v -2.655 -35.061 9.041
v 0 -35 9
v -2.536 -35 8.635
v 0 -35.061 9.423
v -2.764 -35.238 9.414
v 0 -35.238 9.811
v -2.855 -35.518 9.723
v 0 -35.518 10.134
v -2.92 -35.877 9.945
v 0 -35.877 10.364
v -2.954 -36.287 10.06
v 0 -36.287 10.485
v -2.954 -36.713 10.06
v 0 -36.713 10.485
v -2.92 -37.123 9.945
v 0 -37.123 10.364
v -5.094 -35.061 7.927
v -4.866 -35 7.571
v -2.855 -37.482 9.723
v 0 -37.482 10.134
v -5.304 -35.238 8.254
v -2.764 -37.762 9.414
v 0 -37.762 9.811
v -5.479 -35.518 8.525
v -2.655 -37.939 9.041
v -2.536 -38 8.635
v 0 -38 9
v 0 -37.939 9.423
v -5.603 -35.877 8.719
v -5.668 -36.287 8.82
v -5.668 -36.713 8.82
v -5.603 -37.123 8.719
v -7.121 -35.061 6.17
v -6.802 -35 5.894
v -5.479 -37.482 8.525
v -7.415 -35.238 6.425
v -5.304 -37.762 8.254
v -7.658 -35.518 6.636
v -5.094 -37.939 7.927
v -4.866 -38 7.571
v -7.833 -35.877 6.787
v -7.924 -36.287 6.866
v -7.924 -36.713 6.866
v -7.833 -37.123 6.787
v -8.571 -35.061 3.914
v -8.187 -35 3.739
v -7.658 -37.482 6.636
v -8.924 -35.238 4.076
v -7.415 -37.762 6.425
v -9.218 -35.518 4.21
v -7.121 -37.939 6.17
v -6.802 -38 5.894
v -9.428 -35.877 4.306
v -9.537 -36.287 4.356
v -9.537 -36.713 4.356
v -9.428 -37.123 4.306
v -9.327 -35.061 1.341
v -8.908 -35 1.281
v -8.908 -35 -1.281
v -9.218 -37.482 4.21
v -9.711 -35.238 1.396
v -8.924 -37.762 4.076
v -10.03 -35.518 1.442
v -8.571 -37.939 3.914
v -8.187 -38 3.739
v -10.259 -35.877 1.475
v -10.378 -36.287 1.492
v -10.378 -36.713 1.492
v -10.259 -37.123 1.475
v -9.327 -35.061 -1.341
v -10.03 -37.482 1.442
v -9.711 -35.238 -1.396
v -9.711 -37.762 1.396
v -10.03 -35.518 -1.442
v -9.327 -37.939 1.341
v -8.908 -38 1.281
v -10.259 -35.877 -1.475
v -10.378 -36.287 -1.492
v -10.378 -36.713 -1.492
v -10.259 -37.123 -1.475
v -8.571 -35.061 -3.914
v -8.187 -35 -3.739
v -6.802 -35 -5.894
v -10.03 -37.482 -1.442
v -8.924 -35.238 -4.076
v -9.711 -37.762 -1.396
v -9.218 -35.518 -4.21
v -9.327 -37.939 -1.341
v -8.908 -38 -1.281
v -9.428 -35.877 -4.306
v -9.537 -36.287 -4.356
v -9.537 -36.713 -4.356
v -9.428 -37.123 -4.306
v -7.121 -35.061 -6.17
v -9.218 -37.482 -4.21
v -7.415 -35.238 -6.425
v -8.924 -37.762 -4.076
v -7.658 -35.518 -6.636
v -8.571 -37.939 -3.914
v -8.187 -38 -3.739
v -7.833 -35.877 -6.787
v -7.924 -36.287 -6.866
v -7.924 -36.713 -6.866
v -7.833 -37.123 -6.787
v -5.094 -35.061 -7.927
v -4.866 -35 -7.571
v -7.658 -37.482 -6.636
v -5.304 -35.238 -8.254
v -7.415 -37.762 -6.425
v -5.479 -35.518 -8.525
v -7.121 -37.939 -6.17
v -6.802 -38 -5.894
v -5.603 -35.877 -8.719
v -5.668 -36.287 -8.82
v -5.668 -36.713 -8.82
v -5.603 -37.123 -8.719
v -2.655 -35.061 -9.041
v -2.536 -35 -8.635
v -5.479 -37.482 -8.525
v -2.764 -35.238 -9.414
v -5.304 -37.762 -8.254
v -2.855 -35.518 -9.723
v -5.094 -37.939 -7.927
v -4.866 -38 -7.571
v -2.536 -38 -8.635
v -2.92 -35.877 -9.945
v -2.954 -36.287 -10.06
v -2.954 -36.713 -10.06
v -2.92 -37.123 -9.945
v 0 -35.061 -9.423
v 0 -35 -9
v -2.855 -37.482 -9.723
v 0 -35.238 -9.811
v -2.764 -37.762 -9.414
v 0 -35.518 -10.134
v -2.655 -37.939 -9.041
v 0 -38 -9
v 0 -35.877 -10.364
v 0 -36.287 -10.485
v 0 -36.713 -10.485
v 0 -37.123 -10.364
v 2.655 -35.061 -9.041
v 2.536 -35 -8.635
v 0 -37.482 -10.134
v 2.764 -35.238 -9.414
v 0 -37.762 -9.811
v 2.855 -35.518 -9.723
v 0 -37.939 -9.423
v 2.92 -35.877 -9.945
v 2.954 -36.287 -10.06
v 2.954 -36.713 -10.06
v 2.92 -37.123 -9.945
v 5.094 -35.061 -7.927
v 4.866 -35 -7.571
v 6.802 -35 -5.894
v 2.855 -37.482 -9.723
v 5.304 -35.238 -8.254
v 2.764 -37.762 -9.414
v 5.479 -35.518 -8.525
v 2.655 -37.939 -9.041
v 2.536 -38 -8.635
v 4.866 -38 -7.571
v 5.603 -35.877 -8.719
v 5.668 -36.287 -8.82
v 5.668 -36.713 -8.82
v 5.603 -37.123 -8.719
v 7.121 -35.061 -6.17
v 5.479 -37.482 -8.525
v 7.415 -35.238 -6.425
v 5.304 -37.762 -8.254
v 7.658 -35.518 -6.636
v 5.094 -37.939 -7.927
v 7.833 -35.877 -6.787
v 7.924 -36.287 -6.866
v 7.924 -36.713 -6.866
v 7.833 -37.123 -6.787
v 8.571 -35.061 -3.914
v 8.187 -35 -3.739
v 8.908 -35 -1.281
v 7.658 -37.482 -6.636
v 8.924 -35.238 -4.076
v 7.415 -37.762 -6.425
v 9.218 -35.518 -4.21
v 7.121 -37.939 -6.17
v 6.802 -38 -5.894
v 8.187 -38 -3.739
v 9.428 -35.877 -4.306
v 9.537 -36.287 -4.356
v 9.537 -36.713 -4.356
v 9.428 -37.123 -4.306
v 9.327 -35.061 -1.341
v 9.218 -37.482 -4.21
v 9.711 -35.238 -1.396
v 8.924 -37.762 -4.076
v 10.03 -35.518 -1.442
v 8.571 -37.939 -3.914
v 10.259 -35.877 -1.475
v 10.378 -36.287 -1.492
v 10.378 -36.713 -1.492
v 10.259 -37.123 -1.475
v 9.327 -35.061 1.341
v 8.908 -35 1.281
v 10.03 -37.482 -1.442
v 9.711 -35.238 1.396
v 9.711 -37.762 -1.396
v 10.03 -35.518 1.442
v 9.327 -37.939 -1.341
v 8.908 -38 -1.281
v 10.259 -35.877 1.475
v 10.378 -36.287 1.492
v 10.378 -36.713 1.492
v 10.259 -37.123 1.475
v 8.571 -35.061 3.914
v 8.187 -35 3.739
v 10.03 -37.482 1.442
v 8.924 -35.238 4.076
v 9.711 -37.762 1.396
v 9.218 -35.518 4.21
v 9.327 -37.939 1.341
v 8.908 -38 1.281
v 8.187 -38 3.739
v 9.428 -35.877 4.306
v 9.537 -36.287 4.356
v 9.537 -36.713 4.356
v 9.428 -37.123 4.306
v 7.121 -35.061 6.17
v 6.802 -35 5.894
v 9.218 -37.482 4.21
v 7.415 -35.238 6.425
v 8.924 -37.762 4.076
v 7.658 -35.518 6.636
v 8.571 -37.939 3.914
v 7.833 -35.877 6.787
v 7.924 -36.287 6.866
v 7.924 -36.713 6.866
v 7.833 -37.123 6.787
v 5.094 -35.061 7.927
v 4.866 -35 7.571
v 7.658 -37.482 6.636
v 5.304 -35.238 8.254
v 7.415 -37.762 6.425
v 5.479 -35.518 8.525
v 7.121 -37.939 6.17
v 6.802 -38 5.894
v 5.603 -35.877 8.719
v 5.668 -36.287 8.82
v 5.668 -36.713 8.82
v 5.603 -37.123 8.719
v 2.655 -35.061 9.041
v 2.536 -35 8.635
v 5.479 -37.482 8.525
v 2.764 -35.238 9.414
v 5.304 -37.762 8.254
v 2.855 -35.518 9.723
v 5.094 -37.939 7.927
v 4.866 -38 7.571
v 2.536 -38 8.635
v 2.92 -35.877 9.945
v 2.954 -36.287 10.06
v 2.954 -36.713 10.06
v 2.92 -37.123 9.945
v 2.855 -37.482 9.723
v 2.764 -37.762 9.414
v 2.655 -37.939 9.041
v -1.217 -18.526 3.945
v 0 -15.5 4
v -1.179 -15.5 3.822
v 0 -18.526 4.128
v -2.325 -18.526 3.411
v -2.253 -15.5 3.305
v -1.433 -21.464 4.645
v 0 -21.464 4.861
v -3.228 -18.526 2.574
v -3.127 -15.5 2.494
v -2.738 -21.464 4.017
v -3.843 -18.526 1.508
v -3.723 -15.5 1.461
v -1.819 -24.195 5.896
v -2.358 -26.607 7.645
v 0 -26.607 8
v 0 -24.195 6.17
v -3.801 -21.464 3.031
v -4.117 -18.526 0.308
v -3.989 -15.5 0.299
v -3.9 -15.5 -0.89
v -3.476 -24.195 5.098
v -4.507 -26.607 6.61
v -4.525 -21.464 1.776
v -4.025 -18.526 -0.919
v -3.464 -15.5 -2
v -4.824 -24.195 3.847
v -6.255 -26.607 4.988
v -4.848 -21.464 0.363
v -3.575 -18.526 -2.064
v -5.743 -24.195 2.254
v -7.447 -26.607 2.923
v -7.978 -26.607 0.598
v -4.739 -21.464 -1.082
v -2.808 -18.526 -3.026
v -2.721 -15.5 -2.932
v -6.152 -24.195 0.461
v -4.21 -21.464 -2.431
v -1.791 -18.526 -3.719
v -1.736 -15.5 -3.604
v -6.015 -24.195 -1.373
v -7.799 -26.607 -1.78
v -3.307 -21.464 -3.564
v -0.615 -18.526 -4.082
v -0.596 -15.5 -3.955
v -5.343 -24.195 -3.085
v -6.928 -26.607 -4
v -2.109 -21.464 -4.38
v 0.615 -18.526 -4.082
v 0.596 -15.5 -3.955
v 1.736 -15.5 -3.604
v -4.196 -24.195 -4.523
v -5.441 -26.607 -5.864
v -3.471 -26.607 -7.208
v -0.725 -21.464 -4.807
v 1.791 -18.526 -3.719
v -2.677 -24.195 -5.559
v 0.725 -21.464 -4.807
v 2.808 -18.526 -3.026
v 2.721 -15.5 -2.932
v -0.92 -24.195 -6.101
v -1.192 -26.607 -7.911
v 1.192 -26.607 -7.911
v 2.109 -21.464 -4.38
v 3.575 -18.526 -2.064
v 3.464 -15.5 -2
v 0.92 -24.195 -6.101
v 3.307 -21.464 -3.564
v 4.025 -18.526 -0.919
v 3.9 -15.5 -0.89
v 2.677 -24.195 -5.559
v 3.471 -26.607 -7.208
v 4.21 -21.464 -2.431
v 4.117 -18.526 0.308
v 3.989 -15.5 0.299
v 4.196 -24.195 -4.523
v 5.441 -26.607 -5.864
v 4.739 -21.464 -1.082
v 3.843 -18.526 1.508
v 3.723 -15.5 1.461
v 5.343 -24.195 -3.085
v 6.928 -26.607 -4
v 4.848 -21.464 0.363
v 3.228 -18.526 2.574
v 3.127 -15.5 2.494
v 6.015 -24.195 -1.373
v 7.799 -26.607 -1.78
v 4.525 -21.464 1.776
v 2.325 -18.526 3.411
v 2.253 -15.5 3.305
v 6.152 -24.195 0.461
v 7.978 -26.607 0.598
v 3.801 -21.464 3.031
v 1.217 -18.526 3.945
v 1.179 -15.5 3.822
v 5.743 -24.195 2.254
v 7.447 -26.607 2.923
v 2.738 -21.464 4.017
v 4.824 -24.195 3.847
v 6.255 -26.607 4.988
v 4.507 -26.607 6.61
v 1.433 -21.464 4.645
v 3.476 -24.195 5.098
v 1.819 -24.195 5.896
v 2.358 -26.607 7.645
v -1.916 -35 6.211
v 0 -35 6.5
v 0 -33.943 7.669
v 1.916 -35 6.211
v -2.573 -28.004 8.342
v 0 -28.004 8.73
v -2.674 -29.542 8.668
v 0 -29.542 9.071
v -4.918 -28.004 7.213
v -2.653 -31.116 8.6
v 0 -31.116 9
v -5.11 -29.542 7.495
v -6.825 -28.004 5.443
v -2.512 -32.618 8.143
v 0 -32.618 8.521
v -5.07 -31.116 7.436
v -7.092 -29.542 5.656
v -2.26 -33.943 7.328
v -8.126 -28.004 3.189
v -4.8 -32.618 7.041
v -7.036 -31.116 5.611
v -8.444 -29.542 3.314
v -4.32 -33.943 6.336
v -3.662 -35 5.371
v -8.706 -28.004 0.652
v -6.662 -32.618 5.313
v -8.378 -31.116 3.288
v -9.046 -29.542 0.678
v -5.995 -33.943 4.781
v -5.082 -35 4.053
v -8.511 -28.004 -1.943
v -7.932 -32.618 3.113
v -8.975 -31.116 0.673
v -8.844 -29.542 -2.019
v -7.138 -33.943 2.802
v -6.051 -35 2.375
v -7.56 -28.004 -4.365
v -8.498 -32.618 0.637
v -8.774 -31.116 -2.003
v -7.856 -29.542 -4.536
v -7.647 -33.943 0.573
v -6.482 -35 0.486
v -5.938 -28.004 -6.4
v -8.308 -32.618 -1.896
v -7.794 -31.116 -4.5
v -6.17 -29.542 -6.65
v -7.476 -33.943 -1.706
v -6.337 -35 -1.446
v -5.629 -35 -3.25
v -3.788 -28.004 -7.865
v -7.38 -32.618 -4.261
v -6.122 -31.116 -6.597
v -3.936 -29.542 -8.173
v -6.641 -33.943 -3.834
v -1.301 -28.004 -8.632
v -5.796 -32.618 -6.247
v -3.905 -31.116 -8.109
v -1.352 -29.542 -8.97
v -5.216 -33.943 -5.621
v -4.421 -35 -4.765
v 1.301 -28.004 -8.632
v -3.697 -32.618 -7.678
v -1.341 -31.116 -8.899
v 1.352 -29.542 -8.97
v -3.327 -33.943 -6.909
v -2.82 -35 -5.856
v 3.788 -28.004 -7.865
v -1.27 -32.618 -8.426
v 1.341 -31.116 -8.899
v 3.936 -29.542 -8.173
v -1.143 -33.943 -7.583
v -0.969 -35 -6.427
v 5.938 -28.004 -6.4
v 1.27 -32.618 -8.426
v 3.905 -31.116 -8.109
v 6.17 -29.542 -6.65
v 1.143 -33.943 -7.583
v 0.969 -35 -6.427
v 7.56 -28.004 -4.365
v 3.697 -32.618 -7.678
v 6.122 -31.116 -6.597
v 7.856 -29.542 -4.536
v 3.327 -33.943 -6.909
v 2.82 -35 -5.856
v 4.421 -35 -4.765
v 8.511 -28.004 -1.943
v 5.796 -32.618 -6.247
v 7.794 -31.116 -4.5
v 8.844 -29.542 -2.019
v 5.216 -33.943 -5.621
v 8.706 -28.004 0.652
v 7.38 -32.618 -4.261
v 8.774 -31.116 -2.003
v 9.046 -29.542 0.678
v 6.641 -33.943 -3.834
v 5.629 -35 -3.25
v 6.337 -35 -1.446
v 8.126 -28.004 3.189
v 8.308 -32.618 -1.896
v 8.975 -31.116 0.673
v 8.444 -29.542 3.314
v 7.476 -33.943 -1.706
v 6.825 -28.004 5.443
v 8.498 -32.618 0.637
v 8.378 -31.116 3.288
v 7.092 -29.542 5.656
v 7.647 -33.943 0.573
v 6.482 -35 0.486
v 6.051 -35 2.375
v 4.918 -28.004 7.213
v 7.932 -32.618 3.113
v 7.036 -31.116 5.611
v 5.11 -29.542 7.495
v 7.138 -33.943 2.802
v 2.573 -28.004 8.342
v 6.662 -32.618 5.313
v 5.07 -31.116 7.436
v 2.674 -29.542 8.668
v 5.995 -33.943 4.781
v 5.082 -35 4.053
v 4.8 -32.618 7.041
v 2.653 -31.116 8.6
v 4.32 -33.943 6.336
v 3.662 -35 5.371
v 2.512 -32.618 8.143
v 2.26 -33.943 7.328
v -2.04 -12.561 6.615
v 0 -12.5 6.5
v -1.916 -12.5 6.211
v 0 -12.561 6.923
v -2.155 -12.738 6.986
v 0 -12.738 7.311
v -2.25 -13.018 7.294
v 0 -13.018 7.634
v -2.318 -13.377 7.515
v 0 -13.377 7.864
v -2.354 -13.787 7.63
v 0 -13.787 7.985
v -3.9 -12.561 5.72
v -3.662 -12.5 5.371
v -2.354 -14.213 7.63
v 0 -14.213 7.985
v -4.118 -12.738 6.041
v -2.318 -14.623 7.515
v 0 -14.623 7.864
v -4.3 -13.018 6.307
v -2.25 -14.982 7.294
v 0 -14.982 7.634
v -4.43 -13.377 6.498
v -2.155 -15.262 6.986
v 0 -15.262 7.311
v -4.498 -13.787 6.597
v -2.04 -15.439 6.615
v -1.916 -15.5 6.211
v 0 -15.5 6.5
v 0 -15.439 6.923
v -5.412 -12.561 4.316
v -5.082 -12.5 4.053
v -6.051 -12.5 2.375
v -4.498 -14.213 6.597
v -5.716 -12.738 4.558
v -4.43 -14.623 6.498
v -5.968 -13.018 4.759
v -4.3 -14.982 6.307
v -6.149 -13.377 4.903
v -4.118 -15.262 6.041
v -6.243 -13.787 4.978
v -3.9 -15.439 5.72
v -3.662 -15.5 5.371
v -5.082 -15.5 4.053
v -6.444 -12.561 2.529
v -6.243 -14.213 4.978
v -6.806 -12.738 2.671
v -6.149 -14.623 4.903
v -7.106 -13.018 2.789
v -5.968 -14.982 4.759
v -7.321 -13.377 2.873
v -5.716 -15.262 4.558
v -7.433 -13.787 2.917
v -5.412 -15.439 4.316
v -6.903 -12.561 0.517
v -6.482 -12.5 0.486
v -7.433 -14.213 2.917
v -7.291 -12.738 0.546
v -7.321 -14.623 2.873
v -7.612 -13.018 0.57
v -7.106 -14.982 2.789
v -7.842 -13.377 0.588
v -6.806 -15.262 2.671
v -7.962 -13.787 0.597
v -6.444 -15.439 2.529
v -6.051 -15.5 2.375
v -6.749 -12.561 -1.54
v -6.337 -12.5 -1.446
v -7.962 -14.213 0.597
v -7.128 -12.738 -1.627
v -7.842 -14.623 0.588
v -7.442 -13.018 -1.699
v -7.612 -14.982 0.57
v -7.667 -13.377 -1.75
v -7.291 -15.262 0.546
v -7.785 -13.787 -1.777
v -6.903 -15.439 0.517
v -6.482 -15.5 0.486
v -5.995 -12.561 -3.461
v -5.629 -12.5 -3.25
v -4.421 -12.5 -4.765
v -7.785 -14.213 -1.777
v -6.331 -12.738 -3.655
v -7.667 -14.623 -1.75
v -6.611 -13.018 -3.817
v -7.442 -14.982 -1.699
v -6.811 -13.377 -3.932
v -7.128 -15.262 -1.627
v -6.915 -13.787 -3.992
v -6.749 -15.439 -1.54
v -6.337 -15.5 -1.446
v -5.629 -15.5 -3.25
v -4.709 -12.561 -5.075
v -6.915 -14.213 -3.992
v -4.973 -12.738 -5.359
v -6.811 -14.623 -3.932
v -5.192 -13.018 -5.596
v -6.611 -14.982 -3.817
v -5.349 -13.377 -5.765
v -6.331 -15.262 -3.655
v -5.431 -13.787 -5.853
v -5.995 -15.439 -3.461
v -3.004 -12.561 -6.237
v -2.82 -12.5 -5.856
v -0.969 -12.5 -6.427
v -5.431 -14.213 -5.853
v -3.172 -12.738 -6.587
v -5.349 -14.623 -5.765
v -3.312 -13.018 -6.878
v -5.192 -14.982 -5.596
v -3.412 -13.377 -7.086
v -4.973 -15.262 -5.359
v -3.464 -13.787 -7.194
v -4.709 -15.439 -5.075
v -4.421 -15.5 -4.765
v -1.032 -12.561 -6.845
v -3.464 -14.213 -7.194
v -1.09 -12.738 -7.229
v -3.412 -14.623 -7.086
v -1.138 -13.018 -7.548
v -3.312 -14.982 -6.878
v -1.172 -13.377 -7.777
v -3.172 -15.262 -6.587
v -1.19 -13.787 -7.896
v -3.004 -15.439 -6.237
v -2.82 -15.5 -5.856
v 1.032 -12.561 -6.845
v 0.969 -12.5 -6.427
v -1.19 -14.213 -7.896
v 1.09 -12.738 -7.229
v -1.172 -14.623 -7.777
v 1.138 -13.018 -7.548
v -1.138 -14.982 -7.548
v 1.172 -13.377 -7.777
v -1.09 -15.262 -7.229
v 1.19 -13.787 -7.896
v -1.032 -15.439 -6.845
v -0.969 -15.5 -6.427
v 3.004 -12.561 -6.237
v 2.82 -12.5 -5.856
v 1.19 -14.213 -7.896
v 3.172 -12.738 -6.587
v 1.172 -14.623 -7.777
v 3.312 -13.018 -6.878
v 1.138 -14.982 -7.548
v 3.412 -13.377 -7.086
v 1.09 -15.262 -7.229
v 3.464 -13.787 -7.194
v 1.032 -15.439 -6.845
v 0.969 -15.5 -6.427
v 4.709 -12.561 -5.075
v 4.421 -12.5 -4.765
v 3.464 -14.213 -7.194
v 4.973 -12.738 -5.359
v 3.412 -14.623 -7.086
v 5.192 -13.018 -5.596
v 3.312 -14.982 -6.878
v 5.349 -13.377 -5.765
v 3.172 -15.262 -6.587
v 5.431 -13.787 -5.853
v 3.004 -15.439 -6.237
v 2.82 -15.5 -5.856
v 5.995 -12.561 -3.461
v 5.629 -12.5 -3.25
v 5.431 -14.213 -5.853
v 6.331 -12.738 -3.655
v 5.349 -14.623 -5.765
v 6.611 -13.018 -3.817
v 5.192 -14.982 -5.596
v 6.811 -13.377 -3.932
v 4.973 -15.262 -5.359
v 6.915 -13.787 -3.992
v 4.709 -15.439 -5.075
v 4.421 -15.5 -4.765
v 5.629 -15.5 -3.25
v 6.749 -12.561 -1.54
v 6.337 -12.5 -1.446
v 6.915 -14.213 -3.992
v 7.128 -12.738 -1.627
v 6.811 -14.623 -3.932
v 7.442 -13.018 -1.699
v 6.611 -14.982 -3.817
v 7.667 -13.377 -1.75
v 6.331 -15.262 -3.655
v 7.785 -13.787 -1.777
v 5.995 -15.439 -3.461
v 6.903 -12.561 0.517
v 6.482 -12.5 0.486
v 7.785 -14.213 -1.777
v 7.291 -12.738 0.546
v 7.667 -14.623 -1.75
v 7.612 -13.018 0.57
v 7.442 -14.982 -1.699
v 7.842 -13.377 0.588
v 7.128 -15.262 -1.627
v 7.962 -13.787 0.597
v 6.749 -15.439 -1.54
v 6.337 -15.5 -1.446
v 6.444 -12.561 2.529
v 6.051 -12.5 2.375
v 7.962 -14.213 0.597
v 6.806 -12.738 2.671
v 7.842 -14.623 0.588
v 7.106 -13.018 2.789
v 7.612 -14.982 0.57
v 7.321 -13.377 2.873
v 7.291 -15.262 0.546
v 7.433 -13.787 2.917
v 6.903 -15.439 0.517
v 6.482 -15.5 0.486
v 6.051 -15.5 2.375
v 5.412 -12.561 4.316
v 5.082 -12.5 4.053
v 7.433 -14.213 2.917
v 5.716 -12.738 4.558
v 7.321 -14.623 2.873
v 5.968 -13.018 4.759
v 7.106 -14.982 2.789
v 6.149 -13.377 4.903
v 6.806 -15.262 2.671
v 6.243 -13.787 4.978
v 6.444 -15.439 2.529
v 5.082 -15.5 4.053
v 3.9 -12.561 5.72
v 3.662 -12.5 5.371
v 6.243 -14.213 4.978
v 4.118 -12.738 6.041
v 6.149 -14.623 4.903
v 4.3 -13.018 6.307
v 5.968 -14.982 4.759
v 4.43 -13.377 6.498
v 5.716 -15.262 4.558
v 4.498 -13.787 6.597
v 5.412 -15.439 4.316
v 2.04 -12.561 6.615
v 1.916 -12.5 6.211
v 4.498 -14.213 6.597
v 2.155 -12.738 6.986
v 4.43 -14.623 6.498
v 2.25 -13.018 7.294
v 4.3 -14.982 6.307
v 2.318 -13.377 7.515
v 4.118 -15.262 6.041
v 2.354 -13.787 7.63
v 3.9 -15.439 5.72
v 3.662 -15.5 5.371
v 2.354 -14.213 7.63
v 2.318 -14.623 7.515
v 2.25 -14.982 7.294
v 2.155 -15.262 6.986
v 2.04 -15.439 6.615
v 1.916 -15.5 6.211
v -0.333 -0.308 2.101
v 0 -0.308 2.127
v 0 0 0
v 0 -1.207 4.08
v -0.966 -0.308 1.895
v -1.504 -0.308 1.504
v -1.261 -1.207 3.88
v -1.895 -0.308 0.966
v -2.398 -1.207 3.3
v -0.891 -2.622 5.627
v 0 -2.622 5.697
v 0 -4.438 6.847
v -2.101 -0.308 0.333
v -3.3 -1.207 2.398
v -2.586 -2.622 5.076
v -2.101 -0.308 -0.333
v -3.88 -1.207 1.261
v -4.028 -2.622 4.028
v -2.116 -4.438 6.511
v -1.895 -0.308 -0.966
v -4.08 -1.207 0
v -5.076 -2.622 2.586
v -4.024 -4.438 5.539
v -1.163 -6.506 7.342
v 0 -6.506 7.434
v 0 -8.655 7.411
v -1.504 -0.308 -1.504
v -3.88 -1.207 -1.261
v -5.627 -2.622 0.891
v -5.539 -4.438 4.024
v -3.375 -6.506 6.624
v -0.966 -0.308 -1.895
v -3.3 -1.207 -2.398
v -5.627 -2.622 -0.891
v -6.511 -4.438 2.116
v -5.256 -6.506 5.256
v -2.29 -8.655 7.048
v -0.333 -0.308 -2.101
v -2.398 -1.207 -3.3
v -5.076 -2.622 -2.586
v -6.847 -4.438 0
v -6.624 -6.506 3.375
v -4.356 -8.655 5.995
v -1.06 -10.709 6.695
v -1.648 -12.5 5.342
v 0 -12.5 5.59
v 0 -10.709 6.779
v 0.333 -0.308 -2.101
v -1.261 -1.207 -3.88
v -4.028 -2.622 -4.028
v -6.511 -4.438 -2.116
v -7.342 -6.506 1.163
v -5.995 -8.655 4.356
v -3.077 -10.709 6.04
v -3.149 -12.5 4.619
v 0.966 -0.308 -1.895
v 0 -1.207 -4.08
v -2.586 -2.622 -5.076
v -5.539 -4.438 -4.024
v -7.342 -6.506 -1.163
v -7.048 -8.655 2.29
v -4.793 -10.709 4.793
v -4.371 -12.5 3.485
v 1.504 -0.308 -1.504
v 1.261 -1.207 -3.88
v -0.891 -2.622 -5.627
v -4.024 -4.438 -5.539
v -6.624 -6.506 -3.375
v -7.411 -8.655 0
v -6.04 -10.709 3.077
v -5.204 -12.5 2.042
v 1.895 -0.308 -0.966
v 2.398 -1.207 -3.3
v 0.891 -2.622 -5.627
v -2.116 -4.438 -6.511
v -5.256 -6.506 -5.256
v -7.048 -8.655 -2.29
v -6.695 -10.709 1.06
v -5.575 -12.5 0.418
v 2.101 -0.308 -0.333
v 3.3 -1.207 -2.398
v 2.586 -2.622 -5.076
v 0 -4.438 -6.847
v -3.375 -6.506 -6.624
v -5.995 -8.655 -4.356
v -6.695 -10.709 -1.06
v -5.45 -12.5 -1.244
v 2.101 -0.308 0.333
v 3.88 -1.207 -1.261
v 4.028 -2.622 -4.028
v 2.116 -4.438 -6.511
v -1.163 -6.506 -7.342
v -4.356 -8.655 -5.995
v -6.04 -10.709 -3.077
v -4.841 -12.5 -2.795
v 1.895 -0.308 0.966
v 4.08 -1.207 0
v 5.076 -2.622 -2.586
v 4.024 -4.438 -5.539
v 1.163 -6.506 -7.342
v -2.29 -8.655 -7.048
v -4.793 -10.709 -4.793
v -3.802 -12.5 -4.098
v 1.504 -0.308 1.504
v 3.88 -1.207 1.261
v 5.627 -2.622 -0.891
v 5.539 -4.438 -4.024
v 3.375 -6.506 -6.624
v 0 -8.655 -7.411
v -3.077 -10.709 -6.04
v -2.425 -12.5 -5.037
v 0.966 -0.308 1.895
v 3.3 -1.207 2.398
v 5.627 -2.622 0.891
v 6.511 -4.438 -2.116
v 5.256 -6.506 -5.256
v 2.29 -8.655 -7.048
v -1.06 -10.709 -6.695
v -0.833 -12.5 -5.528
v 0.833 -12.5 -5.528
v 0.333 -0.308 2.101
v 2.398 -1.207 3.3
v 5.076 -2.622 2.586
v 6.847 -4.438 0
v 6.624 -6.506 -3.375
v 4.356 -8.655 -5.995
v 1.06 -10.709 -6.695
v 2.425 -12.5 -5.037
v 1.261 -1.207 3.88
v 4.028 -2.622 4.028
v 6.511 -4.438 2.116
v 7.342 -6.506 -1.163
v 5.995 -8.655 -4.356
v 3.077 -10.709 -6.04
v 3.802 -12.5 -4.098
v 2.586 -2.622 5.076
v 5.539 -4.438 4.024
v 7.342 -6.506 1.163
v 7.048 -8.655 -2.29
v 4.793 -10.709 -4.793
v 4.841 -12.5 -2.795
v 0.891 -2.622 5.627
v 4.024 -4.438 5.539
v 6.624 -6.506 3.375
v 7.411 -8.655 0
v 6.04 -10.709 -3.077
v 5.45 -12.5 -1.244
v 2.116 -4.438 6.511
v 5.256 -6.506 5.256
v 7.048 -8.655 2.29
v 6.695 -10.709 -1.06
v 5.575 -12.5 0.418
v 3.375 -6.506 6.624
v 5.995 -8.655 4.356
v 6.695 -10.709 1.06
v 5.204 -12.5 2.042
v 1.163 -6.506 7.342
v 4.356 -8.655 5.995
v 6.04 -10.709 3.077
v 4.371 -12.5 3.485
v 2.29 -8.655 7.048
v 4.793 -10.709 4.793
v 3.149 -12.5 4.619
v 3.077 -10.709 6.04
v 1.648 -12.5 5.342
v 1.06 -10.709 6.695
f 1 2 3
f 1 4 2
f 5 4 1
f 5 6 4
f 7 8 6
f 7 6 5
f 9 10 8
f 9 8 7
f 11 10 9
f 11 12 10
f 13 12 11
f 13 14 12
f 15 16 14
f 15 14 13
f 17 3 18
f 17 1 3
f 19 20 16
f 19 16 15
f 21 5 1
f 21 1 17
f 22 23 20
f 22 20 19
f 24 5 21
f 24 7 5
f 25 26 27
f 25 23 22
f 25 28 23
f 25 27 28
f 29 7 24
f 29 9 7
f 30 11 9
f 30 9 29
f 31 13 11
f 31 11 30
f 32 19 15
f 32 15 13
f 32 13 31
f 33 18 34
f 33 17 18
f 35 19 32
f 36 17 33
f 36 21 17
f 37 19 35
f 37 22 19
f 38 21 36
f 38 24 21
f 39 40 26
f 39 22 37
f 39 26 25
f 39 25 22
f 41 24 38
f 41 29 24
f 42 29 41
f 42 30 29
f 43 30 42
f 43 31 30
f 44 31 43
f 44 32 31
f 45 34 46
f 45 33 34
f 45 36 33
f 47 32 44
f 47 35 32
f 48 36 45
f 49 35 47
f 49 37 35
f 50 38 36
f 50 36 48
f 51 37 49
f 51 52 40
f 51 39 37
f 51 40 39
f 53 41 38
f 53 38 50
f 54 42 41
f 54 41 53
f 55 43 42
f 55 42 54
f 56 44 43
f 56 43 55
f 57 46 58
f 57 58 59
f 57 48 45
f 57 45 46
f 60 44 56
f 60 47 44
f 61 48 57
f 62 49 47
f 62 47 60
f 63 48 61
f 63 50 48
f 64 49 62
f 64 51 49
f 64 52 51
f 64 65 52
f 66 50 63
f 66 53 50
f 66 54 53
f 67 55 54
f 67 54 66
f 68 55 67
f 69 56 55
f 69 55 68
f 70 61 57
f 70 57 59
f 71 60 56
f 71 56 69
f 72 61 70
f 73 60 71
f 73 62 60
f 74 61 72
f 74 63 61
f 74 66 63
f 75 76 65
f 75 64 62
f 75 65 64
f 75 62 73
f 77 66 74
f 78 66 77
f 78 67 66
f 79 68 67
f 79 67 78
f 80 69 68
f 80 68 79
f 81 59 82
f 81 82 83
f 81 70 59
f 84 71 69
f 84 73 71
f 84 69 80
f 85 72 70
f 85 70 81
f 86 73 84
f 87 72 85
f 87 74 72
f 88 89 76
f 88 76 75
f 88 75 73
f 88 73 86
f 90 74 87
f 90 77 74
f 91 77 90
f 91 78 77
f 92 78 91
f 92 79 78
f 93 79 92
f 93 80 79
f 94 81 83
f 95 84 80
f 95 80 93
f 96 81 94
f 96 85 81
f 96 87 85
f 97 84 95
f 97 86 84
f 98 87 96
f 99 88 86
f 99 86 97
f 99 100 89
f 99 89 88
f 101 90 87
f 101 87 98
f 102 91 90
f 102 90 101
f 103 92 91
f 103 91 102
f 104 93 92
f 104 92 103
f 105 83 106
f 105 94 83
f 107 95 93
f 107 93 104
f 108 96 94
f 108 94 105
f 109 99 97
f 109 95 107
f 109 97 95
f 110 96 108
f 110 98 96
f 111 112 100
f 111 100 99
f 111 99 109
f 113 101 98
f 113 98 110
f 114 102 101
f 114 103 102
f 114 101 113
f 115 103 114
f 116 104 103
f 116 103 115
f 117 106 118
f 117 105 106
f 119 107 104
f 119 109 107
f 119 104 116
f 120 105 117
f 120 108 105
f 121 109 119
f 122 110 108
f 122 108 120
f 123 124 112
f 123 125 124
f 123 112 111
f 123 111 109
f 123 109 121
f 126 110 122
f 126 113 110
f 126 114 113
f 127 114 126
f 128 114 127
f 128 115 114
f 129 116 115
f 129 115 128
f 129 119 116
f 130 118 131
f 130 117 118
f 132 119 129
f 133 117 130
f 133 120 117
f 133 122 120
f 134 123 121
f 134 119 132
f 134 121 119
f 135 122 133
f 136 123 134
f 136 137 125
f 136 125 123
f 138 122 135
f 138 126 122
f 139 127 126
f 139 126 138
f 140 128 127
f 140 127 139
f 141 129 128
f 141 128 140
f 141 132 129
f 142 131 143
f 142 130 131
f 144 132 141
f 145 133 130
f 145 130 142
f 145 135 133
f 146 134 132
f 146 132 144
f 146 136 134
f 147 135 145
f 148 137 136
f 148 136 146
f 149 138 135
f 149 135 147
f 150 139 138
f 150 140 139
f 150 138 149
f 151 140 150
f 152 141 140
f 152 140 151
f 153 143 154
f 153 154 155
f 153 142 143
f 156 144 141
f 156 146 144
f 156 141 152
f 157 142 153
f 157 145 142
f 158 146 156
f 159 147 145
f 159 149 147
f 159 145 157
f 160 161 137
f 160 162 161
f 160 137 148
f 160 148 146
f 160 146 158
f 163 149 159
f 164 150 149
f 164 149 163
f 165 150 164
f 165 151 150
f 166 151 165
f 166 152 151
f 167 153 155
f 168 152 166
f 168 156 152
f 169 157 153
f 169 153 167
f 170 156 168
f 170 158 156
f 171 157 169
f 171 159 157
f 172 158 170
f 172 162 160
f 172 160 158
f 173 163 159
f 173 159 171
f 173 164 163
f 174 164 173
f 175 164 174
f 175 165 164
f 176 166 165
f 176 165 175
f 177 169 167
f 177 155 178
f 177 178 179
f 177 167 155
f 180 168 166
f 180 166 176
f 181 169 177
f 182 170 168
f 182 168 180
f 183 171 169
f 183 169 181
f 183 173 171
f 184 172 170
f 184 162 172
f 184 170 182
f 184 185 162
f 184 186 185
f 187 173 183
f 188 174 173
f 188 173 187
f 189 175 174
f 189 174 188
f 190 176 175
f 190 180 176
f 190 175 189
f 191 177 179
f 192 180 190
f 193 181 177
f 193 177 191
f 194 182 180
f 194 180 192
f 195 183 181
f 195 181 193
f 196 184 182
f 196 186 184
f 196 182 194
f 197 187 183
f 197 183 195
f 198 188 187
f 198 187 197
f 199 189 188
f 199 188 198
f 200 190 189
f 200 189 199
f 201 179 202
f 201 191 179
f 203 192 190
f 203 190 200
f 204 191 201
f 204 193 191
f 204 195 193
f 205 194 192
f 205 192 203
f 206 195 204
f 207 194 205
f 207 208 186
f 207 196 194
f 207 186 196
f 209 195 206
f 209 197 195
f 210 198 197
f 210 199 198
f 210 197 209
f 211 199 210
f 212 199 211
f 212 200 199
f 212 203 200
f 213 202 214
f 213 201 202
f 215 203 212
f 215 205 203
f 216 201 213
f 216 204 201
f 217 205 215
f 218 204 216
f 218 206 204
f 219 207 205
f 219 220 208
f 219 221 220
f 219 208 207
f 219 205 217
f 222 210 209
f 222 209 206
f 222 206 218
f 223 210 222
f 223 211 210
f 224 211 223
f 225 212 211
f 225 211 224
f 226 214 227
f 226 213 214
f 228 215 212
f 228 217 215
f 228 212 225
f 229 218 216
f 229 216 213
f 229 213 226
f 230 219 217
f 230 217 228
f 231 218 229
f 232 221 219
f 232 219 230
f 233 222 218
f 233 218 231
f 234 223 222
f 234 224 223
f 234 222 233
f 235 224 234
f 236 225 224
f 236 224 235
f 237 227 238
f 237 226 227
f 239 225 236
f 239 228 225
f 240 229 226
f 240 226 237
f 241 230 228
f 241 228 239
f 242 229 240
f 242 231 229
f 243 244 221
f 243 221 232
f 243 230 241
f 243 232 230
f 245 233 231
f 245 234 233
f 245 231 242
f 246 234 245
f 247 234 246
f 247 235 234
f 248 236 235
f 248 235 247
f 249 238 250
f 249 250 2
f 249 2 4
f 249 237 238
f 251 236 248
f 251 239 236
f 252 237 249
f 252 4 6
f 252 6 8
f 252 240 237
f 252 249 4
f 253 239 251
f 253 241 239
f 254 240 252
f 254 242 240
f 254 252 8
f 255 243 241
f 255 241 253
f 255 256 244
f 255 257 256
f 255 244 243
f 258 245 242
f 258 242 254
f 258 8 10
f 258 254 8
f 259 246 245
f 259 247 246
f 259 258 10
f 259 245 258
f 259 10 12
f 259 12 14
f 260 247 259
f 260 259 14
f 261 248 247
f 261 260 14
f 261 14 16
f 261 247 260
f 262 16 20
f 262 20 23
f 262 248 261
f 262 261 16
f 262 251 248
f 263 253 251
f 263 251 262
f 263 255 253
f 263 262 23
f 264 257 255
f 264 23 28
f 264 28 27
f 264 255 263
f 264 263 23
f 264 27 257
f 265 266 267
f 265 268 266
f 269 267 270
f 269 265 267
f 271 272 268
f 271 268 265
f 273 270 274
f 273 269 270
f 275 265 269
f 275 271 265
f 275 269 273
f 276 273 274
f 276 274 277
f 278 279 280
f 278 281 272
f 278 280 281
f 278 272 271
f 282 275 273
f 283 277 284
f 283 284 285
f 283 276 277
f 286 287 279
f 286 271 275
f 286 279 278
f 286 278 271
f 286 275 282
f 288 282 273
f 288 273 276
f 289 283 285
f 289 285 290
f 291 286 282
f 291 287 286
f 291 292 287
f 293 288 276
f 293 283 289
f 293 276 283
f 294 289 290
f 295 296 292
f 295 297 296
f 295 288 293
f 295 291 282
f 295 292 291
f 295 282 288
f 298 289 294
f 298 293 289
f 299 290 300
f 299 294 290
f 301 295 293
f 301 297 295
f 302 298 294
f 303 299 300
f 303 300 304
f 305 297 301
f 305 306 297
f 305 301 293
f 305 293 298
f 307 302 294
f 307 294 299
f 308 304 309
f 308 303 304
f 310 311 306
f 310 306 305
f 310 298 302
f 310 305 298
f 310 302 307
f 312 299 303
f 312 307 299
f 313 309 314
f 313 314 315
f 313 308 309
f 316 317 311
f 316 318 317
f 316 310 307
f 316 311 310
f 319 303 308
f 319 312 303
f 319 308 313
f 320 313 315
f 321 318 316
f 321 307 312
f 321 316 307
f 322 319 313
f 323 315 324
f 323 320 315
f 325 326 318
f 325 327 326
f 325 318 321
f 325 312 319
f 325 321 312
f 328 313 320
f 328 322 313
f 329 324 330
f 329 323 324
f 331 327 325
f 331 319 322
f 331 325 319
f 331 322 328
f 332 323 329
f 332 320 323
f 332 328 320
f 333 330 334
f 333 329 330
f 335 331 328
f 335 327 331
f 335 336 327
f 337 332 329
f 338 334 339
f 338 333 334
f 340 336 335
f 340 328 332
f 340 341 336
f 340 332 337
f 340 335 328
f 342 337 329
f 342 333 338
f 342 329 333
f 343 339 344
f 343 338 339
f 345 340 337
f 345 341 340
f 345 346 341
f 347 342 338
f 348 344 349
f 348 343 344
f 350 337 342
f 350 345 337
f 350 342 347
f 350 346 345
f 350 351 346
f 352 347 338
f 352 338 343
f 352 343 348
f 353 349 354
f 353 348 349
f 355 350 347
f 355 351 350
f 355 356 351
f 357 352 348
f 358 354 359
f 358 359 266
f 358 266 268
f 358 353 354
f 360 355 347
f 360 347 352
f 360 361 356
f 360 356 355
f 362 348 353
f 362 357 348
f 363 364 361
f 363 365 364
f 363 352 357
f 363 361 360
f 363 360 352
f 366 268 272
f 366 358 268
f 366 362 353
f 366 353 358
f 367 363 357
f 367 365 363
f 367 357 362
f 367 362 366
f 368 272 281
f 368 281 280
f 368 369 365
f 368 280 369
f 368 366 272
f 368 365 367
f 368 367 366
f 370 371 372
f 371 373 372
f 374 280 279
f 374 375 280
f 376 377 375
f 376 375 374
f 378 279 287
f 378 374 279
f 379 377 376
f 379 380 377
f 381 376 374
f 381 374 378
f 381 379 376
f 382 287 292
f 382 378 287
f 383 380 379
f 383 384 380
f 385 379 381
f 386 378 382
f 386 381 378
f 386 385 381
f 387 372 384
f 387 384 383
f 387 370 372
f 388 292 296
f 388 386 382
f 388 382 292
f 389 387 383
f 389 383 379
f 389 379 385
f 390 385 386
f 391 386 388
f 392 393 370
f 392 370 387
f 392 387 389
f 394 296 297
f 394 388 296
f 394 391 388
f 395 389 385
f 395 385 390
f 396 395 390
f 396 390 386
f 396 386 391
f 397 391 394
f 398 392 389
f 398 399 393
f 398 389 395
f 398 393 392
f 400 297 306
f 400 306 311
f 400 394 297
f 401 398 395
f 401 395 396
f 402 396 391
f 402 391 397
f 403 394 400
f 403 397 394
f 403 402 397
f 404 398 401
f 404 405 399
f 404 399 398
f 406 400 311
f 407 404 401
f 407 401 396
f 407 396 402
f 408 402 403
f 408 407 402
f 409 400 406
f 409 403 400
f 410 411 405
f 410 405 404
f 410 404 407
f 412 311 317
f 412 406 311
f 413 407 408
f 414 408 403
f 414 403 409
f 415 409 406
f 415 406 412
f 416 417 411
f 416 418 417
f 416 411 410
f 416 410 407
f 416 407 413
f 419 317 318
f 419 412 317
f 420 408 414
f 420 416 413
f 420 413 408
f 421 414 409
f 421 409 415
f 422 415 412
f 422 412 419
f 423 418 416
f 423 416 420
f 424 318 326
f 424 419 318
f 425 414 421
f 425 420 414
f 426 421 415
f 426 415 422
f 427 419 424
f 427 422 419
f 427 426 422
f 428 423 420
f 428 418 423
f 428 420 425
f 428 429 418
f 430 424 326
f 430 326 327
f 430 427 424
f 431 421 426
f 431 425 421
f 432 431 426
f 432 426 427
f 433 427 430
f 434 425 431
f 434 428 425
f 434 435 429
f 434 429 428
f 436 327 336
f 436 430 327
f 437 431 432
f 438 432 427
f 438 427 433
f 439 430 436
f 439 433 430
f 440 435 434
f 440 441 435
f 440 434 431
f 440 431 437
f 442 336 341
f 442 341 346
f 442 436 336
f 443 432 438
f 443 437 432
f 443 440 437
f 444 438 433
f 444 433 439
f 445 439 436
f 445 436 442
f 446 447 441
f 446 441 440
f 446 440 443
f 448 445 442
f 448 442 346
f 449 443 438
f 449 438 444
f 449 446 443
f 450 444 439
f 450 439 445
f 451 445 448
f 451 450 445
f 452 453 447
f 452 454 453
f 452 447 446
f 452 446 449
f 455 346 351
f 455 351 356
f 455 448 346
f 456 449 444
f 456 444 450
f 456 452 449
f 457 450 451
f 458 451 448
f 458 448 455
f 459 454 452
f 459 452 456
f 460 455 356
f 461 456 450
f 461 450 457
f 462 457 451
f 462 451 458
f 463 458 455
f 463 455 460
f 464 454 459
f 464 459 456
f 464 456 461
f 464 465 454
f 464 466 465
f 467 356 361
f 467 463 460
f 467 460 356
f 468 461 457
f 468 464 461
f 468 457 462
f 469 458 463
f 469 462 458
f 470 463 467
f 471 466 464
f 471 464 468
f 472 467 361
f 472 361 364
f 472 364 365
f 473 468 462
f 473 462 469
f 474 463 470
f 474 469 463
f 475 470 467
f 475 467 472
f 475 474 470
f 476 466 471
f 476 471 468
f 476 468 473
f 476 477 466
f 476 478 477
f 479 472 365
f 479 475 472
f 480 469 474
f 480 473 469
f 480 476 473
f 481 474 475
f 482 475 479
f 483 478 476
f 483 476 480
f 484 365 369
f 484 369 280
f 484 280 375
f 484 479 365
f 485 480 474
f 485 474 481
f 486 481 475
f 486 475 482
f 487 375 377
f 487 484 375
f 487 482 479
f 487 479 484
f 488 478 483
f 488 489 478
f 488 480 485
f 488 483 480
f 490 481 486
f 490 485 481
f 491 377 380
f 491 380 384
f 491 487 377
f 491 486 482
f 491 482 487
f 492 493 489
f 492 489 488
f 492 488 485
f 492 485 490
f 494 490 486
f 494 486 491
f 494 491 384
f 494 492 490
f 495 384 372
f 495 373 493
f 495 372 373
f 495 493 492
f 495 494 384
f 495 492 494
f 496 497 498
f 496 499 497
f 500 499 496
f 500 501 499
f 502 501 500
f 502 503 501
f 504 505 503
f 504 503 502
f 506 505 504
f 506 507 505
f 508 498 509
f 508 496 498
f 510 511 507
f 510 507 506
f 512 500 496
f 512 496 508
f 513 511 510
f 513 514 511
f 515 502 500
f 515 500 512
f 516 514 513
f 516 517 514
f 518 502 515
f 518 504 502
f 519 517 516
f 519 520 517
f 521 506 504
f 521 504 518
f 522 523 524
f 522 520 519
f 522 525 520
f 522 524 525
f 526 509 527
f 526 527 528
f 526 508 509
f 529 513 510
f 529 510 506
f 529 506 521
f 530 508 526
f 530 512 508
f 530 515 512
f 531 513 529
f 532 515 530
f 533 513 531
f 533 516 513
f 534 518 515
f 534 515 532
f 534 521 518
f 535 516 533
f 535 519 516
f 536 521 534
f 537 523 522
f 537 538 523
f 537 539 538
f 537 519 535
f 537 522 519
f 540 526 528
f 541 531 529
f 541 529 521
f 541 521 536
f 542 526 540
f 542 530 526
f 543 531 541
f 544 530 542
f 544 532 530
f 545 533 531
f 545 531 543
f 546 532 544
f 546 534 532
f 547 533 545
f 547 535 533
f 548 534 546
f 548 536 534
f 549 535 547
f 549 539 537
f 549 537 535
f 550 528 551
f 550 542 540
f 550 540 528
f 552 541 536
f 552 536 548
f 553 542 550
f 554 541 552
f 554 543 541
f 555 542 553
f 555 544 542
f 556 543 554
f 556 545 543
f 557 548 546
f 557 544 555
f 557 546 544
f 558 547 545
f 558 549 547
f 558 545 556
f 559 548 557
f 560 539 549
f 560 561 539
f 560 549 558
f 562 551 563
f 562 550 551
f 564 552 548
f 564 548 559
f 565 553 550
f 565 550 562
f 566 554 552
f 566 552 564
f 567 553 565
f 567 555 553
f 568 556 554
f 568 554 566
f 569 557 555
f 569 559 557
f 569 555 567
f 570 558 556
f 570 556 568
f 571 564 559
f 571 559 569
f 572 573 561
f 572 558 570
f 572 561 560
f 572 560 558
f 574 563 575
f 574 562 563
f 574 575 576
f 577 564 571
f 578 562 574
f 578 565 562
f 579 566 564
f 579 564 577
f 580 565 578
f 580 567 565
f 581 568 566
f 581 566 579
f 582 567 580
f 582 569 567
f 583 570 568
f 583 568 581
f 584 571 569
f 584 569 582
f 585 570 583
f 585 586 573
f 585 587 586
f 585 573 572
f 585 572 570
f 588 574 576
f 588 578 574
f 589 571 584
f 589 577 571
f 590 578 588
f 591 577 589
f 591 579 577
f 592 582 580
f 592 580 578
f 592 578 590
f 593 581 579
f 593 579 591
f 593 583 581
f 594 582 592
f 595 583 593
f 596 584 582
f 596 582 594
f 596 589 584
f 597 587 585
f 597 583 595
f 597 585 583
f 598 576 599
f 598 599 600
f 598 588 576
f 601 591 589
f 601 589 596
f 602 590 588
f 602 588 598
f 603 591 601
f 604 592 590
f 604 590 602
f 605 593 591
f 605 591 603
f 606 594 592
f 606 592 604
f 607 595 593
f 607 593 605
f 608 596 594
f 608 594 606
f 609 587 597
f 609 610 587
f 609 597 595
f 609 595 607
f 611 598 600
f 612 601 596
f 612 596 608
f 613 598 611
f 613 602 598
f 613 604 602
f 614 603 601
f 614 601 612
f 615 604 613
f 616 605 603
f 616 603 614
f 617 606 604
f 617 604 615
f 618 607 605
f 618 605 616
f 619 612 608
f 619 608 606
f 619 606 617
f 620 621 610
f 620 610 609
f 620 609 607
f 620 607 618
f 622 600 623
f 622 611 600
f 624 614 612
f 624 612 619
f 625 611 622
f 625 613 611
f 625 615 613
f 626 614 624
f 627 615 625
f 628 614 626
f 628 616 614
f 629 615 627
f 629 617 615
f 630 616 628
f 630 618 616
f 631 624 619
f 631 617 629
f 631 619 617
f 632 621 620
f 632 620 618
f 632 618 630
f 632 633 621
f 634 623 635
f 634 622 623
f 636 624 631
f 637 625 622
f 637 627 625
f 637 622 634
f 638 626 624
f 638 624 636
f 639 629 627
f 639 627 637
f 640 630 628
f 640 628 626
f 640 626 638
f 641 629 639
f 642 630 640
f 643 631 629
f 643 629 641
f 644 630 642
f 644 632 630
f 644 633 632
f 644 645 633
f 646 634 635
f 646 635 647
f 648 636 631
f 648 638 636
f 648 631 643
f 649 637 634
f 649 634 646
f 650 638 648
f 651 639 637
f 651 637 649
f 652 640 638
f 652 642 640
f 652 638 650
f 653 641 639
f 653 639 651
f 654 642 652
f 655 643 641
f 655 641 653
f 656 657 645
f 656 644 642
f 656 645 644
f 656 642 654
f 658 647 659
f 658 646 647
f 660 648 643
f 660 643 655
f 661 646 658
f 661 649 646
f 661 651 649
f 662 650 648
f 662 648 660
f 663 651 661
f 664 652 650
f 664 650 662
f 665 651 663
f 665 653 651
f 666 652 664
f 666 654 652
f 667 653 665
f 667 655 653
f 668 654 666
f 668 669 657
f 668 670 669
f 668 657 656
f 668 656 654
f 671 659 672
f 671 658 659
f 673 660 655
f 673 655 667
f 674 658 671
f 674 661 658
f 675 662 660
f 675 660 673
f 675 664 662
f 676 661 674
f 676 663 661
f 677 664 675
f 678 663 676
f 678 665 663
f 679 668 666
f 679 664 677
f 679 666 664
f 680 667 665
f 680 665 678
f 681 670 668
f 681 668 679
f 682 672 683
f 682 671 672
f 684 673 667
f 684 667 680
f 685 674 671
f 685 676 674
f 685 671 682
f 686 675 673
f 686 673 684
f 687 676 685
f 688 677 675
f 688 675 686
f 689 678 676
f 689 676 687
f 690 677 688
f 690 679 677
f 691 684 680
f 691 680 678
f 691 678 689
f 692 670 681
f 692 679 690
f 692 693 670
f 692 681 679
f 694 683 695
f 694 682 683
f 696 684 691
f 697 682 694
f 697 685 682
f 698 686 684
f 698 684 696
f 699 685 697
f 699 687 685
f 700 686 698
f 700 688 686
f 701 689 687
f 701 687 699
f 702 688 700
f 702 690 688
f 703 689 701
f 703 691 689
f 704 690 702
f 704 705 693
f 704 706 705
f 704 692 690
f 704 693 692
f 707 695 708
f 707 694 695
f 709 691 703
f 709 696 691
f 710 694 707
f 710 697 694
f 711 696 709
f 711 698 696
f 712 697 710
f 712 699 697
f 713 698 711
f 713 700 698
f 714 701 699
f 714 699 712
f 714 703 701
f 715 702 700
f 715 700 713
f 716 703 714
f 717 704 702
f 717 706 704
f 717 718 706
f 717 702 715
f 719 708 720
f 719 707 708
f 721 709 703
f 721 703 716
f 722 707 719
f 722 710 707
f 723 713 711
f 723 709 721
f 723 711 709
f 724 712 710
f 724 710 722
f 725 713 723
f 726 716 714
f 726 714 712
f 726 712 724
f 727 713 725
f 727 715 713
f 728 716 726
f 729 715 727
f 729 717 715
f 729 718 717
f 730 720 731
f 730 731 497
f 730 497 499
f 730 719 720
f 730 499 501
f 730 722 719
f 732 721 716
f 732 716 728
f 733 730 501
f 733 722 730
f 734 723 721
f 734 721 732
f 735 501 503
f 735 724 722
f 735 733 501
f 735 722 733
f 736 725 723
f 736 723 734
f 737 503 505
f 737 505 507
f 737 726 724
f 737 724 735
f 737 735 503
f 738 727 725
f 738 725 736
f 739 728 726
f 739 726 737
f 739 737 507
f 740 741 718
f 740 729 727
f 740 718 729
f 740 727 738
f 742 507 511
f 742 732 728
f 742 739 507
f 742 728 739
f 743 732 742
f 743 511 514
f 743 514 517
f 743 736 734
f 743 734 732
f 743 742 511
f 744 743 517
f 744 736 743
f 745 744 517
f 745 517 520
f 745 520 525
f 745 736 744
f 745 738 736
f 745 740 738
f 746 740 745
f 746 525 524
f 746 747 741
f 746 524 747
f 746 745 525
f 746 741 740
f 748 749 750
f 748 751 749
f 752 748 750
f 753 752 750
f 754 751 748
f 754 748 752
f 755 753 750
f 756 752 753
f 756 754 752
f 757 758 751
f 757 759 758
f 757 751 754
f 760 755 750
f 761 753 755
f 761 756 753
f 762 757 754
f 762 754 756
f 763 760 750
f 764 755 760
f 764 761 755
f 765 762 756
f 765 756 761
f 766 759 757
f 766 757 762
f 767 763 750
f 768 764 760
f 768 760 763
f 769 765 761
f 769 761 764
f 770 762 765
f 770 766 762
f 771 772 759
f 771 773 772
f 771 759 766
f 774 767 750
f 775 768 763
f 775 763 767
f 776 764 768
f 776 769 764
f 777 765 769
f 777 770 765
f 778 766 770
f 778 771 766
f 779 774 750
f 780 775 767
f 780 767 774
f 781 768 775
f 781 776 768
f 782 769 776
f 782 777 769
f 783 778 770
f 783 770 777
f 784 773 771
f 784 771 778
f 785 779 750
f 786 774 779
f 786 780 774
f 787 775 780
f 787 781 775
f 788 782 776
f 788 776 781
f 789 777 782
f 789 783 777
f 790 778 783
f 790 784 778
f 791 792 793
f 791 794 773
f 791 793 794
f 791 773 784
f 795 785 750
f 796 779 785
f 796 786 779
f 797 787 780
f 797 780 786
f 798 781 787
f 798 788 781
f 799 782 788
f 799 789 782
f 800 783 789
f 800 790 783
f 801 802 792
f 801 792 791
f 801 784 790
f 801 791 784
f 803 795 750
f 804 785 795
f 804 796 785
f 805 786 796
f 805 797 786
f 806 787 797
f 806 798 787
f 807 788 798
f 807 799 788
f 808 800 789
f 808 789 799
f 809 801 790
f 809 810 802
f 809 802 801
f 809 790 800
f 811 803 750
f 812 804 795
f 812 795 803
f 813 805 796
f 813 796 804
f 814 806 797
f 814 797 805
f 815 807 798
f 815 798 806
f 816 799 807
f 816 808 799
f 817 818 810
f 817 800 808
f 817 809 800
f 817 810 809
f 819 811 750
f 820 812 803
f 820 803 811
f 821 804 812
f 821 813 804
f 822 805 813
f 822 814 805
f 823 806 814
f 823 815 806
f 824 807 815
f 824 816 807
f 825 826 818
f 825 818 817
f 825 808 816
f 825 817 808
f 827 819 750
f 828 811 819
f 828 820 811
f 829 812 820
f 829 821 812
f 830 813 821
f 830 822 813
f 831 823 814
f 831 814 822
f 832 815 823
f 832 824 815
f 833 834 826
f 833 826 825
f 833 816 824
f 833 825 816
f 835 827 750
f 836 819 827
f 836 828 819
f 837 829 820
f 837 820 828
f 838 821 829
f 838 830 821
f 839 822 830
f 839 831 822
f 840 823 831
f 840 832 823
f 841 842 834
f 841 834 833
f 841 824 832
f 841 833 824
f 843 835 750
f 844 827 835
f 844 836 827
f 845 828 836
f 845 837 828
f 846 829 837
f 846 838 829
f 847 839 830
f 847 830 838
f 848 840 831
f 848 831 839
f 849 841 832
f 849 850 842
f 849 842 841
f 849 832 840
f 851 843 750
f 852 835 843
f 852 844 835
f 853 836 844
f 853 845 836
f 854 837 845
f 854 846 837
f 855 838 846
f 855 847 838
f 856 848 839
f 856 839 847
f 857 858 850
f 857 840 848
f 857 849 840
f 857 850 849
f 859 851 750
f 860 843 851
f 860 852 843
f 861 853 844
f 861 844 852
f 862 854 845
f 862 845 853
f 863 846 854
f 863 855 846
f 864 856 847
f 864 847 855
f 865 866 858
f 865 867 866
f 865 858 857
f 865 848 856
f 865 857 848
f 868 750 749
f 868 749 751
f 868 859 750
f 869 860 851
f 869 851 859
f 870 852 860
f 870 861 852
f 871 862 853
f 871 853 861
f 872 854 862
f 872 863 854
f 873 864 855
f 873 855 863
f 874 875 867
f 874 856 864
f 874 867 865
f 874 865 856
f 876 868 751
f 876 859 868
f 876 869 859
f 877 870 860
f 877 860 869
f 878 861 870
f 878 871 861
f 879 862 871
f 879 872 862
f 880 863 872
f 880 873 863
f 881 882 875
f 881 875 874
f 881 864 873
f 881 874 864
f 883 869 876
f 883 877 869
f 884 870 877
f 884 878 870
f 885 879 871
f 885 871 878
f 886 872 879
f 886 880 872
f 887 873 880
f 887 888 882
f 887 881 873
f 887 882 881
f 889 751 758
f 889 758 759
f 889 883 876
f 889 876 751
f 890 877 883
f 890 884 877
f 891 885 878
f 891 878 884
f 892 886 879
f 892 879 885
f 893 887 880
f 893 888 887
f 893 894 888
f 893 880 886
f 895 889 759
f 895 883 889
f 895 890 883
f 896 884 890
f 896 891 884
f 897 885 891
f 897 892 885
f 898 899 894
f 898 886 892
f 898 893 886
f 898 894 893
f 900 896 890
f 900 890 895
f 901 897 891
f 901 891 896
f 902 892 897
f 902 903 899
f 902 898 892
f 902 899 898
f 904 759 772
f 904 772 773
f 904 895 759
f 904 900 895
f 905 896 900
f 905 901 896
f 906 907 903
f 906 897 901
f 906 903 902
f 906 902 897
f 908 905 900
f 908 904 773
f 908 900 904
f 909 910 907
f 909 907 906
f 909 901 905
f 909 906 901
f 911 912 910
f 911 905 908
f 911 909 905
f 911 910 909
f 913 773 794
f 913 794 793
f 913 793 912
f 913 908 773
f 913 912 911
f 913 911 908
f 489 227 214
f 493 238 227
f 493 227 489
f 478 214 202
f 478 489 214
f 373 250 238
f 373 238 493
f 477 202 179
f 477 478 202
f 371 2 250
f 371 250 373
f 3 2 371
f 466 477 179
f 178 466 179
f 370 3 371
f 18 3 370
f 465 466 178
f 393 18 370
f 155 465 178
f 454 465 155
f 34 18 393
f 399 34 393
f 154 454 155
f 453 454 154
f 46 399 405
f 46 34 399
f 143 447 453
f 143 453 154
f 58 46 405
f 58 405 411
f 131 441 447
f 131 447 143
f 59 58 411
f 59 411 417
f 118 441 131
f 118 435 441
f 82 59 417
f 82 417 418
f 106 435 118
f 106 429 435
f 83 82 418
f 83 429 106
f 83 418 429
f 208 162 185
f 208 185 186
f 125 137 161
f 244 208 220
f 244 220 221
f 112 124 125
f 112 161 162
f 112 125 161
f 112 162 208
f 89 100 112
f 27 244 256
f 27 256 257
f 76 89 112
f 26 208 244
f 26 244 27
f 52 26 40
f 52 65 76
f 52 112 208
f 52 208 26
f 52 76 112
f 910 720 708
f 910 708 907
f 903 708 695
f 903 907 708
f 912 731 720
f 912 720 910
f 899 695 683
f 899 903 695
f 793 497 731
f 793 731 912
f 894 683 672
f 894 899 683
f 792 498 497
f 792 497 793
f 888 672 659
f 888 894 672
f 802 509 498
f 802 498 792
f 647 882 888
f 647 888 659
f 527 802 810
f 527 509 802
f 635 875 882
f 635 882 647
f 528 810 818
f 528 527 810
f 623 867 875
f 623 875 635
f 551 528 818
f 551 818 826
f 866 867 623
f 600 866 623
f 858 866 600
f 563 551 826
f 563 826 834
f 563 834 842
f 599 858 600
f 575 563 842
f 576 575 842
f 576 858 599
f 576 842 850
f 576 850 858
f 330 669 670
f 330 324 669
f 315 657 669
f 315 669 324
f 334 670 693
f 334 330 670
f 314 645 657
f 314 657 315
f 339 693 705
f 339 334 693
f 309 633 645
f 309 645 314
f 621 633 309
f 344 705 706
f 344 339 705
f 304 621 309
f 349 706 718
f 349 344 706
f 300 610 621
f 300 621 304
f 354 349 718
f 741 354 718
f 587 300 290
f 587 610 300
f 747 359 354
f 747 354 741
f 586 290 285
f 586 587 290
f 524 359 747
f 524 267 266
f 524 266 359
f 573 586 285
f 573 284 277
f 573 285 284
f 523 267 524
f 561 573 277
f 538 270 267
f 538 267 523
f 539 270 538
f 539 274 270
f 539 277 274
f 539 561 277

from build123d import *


with BuildPart() as part:
    # Pawn Sketch Profile → Pawn Revolve (revolve)
    with BuildSketch(Plane.XY, mode=Mode.PRIVATE) as pawn_revolve_sk:
        with BuildLine():
            Line((-5.590169944, -12.5), (0, -12.5))
            Line((0, -12.5), (0, 0))
            ThreePointArc((0, 0), (-6.846531969, -4.438137822), (-5.590169944, -12.5))
        make_face()
        with BuildLine():
            Line((-4, -15.5), (0, -15.5))
            Line((0, -15.5), (0, -12.5))
            Line((0, -12.5), (-5.590169944, -12.5))
            Line((-5.590169944, -12.5), (-6.5, -12.5))
            ThreePointArc((-6.5, -12.5), (-8, -14), (-6.5, -15.5))
            Line((-6.5, -15.5), (-4, -15.5))
        make_face()
        with BuildLine():
            Line((-6.5, -35), (0, -35))
            Line((0, -35), (0, -15.5))
            Line((0, -15.5), (-4, -15.5))
            ThreePointArc((-4, -15.5), (-4.861355712, -21.463638541), (-8, -26.607161685))
            ThreePointArc((-8, -26.607161685), (-9, -31.116347502), (-6.5, -35))
        make_face()
        with BuildLine():
            Line((-9, -38), (0, -38))
            Line((0, -38), (0, -35))
            Line((0, -35), (-6.5, -35))
            Line((-6.5, -35), (-9, -35))
            ThreePointArc((-9, -35), (-10.5, -36.5), (-9, -38))
        make_face()
    revolve(pawn_revolve_sk.sketch.rotate(Axis((0, 16.505902718, 0), (0, -1, 0)), 270), axis=Axis((0, 16.505902718, 0), (0, -1, 0)))


solid = part.part
